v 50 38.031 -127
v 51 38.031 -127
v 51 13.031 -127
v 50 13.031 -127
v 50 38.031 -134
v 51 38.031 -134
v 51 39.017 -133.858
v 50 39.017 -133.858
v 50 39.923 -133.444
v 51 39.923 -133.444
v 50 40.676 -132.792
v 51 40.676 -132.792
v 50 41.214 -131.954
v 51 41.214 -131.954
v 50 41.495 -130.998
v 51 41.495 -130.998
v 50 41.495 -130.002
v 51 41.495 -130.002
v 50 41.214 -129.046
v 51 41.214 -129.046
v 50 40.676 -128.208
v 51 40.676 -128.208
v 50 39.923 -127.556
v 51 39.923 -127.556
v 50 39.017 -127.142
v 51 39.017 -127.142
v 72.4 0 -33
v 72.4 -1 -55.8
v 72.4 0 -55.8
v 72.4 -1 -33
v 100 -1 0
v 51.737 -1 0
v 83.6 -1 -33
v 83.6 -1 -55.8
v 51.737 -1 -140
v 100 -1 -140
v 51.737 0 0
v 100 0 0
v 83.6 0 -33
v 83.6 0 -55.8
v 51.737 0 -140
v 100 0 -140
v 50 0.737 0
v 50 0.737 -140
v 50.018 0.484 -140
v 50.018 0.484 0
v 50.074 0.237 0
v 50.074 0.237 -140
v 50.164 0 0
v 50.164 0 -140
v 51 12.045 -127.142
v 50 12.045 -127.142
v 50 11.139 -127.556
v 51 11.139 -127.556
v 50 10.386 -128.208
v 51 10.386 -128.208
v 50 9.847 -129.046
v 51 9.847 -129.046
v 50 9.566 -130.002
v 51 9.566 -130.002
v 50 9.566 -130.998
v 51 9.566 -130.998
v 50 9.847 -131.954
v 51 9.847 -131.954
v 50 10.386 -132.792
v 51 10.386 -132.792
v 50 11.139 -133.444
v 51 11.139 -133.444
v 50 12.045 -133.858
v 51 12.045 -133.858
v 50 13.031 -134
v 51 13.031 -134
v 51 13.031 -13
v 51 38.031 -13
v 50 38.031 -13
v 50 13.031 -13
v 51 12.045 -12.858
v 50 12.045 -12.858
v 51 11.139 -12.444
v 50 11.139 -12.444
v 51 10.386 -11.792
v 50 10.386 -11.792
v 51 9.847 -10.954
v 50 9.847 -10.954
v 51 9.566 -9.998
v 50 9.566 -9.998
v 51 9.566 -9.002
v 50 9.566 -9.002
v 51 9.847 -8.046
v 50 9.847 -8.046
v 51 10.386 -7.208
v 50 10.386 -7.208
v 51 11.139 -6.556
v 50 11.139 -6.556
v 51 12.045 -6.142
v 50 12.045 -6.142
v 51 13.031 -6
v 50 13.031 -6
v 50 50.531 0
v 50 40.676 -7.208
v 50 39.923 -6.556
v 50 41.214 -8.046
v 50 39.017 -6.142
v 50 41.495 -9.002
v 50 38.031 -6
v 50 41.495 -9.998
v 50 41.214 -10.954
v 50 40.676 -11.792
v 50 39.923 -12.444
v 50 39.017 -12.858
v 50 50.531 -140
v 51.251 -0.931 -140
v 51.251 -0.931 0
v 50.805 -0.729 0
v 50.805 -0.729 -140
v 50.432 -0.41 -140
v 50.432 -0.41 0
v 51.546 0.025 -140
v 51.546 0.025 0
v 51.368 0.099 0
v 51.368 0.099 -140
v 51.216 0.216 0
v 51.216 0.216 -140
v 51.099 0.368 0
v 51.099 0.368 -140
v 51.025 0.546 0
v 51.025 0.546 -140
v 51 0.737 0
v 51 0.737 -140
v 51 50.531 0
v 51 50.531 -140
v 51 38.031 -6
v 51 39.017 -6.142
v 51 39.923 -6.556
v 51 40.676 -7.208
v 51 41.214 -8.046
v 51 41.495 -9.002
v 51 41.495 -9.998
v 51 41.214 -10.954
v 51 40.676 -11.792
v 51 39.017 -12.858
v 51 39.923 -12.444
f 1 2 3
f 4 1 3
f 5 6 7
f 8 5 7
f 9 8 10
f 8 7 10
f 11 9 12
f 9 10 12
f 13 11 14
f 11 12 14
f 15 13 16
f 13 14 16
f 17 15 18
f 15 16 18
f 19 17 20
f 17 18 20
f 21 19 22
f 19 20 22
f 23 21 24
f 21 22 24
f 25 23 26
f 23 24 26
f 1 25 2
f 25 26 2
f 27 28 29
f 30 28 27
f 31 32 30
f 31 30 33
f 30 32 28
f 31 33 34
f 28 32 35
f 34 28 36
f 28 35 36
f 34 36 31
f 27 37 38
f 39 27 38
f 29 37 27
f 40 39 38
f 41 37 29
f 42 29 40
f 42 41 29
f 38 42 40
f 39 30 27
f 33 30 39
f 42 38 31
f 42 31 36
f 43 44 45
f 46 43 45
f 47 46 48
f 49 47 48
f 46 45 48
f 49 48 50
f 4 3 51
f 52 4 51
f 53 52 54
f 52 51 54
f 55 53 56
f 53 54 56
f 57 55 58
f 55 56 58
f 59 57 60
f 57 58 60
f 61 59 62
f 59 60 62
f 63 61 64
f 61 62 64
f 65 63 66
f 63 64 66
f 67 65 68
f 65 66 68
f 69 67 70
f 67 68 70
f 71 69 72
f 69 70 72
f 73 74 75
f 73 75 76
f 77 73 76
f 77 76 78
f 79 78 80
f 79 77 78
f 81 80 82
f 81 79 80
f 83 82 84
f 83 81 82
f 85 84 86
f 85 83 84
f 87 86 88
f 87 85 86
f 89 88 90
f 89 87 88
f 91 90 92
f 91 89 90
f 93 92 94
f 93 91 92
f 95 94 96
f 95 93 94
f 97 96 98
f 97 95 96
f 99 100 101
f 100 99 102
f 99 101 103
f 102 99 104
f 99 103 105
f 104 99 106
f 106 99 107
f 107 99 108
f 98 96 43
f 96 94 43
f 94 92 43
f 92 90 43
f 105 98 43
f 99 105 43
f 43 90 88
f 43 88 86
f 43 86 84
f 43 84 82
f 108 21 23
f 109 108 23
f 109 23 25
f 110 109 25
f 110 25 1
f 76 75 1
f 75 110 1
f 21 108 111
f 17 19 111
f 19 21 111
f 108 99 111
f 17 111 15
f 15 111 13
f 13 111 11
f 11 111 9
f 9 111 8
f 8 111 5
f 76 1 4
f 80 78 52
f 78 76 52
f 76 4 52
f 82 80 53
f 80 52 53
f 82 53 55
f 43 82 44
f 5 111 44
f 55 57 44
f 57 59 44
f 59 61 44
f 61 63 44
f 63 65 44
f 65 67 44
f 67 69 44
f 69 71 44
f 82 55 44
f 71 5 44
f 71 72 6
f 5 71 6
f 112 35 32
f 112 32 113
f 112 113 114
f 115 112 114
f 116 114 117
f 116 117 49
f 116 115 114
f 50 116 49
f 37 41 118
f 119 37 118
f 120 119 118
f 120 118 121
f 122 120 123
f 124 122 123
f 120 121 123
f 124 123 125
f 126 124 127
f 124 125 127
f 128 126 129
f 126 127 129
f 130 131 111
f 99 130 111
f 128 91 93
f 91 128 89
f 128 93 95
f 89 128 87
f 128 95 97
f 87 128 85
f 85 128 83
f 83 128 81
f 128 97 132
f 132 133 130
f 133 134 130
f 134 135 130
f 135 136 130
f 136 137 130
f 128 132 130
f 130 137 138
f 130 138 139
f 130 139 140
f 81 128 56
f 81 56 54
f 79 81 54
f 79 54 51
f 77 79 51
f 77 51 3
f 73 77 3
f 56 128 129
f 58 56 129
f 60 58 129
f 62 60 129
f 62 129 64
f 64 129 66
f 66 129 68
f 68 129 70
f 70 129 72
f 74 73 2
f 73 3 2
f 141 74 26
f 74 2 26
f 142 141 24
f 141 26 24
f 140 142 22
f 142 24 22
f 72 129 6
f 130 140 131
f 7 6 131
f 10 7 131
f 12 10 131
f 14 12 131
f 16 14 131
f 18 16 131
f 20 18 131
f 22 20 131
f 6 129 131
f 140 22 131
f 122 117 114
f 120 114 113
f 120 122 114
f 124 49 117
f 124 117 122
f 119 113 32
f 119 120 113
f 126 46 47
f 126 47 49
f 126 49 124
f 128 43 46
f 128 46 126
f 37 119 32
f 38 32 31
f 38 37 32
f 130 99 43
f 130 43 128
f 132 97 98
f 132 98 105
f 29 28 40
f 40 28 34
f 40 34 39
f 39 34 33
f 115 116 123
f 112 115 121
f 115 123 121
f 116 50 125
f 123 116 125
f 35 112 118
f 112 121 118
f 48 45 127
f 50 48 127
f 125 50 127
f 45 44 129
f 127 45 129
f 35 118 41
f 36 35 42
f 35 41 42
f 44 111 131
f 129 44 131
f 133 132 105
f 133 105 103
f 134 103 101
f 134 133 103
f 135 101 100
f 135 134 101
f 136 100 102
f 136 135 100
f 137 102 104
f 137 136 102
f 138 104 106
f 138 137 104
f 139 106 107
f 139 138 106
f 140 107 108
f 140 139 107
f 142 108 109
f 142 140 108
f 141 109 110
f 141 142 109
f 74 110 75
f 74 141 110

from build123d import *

# Parameters (mm, degrees)
SKETCH1_W              = 100
SKETCH1_H              = 140
BASE_FLANGE1_DEPTH     = 1
SKETCHED_START         = -140
SKETCHED_BEND1_DEPTH   = 140
SKETCHED_BEND1_2_DEPTH = 140
CUT_EXTRUDE1_REACH     = 158.698
CUT_EXTRUDE2_REACH     = 181.598
SKETCH17_W             = 11.2
SKETCH17_H             = 22.8


# Read off the part's stored shape, not the designer's step: Sketched Bend1
# Sheet-metal steps are written as plain solids
with BuildPart() as part:
    # Sketch1 → Base-Flange1 (new body)
    with BuildSketch(Plane(origin=(0, 0, 0), x_dir=(1, 0, 0), z_dir=(0, 1, 0))):
        with Locations((50, 70)):
            Rectangle(SKETCH1_W, SKETCH1_H)
    extrude(amount=-BASE_FLANGE1_DEPTH)

    # Sketched Bend1 outline → Sketched Bend1 (cut)
    with BuildSketch(Plane.XY.offset(SKETCHED_START)):
        with BuildLine():
            ThreePointArc((51.7366, -1), (50.804773836, -0.728828115), (50.16395891, 0))
            Line((50.16395891, 0), (0, 0))
            Line((0, 0), (0, -1))
            Line((0, -1), (51.7366, -1))
        make_face()
    extrude(amount=SKETCHED_BEND1_DEPTH, mode=Mode.SUBTRACT)

    # Sketched Bend1 2 outline → Sketched Bend1 2 (add)
    with BuildSketch(Plane.XY.offset(SKETCHED_START)):
        with BuildLine():
            Line((51, 50.530753262), (50, 50.530753262))
            Line((50, 50.530753262), (50, 0.7366))
            ThreePointArc((50, 0.7366), (50.041485243, 0.359286442), (50.16395891, 0))
            Line((50.16395891, 0), (51.7366, 0))
            ThreePointArc((51.7366, 0), (51.215745145, 0.215745145), (51, 0.7366))
            Line((51, 0.7366), (51, 50.530753262))
        make_face()
    extrude(amount=SKETCHED_BEND1_2_DEPTH)

    # Sketch14 → Cut-Extrude1 (cut, up to next)
    with BuildSketch(Plane(origin=(51, 0, 0), x_dir=(0, 0, -1), z_dir=(1, 0, 0)), mode=Mode.PRIVATE) as cut_extrude1_sk1:
        with BuildLine():
            Line((13, 38.030753262), (13, 13.030753262))
            ThreePointArc((13, 13.030753262), (9.5, 9.530753262), (6, 13.030753262))
            Line((6, 13.030753262), (6, 38.030753262))
            ThreePointArc((6, 38.030753262), (9.5, 41.530753262), (13, 38.030753262))
        make_face()
    cut_extrude1_tool1 = extrude(cut_extrude1_sk1.sketch, amount=-CUT_EXTRUDE1_REACH, mode=Mode.PRIVATE) & part.part
    # Sketch14 → Cut-Extrude1 (cut, up to next)
    with BuildSketch(Plane(origin=(51, 0, 0), x_dir=(0, 0, -1), z_dir=(1, 0, 0)), mode=Mode.PRIVATE) as cut_extrude1_sk2:
        with BuildLine():
            Line((127, 38.030753262), (127, 13.030753262))
            ThreePointArc((127, 13.030753262), (130.5, 9.530753262), (134, 13.030753262))
            Line((134, 13.030753262), (134, 38.030753262))
            ThreePointArc((134, 38.030753262), (130.5, 41.530753262), (127, 38.030753262))
        make_face()
    cut_extrude1_tool2 = extrude(cut_extrude1_sk2.sketch, amount=-CUT_EXTRUDE1_REACH, mode=Mode.PRIVATE) & part.part
    add(cut_extrude1_tool1.solids().sort_by_distance((51, 25.530753, -9.5))[0], mode=Mode.SUBTRACT)
    add(cut_extrude1_tool2.solids().sort_by_distance((51, 25.530753, -130.5))[0], mode=Mode.SUBTRACT)

    # Sketch17 → Cut-Extrude2 (cut, up to next)
    with BuildSketch(Plane.XZ.offset(1), mode=Mode.PRIVATE) as cut_extrude2_sk1:
        with Locations((78, -44.4)):
            Rectangle(SKETCH17_W, SKETCH17_H)
    cut_extrude2_tool1 = extrude(cut_extrude2_sk1.sketch, amount=-CUT_EXTRUDE2_REACH, mode=Mode.PRIVATE) & part.part
    add(cut_extrude2_tool1.solids().sort_by_distance((78, -1, -44.4))[0], mode=Mode.SUBTRACT)


solid = part.part
